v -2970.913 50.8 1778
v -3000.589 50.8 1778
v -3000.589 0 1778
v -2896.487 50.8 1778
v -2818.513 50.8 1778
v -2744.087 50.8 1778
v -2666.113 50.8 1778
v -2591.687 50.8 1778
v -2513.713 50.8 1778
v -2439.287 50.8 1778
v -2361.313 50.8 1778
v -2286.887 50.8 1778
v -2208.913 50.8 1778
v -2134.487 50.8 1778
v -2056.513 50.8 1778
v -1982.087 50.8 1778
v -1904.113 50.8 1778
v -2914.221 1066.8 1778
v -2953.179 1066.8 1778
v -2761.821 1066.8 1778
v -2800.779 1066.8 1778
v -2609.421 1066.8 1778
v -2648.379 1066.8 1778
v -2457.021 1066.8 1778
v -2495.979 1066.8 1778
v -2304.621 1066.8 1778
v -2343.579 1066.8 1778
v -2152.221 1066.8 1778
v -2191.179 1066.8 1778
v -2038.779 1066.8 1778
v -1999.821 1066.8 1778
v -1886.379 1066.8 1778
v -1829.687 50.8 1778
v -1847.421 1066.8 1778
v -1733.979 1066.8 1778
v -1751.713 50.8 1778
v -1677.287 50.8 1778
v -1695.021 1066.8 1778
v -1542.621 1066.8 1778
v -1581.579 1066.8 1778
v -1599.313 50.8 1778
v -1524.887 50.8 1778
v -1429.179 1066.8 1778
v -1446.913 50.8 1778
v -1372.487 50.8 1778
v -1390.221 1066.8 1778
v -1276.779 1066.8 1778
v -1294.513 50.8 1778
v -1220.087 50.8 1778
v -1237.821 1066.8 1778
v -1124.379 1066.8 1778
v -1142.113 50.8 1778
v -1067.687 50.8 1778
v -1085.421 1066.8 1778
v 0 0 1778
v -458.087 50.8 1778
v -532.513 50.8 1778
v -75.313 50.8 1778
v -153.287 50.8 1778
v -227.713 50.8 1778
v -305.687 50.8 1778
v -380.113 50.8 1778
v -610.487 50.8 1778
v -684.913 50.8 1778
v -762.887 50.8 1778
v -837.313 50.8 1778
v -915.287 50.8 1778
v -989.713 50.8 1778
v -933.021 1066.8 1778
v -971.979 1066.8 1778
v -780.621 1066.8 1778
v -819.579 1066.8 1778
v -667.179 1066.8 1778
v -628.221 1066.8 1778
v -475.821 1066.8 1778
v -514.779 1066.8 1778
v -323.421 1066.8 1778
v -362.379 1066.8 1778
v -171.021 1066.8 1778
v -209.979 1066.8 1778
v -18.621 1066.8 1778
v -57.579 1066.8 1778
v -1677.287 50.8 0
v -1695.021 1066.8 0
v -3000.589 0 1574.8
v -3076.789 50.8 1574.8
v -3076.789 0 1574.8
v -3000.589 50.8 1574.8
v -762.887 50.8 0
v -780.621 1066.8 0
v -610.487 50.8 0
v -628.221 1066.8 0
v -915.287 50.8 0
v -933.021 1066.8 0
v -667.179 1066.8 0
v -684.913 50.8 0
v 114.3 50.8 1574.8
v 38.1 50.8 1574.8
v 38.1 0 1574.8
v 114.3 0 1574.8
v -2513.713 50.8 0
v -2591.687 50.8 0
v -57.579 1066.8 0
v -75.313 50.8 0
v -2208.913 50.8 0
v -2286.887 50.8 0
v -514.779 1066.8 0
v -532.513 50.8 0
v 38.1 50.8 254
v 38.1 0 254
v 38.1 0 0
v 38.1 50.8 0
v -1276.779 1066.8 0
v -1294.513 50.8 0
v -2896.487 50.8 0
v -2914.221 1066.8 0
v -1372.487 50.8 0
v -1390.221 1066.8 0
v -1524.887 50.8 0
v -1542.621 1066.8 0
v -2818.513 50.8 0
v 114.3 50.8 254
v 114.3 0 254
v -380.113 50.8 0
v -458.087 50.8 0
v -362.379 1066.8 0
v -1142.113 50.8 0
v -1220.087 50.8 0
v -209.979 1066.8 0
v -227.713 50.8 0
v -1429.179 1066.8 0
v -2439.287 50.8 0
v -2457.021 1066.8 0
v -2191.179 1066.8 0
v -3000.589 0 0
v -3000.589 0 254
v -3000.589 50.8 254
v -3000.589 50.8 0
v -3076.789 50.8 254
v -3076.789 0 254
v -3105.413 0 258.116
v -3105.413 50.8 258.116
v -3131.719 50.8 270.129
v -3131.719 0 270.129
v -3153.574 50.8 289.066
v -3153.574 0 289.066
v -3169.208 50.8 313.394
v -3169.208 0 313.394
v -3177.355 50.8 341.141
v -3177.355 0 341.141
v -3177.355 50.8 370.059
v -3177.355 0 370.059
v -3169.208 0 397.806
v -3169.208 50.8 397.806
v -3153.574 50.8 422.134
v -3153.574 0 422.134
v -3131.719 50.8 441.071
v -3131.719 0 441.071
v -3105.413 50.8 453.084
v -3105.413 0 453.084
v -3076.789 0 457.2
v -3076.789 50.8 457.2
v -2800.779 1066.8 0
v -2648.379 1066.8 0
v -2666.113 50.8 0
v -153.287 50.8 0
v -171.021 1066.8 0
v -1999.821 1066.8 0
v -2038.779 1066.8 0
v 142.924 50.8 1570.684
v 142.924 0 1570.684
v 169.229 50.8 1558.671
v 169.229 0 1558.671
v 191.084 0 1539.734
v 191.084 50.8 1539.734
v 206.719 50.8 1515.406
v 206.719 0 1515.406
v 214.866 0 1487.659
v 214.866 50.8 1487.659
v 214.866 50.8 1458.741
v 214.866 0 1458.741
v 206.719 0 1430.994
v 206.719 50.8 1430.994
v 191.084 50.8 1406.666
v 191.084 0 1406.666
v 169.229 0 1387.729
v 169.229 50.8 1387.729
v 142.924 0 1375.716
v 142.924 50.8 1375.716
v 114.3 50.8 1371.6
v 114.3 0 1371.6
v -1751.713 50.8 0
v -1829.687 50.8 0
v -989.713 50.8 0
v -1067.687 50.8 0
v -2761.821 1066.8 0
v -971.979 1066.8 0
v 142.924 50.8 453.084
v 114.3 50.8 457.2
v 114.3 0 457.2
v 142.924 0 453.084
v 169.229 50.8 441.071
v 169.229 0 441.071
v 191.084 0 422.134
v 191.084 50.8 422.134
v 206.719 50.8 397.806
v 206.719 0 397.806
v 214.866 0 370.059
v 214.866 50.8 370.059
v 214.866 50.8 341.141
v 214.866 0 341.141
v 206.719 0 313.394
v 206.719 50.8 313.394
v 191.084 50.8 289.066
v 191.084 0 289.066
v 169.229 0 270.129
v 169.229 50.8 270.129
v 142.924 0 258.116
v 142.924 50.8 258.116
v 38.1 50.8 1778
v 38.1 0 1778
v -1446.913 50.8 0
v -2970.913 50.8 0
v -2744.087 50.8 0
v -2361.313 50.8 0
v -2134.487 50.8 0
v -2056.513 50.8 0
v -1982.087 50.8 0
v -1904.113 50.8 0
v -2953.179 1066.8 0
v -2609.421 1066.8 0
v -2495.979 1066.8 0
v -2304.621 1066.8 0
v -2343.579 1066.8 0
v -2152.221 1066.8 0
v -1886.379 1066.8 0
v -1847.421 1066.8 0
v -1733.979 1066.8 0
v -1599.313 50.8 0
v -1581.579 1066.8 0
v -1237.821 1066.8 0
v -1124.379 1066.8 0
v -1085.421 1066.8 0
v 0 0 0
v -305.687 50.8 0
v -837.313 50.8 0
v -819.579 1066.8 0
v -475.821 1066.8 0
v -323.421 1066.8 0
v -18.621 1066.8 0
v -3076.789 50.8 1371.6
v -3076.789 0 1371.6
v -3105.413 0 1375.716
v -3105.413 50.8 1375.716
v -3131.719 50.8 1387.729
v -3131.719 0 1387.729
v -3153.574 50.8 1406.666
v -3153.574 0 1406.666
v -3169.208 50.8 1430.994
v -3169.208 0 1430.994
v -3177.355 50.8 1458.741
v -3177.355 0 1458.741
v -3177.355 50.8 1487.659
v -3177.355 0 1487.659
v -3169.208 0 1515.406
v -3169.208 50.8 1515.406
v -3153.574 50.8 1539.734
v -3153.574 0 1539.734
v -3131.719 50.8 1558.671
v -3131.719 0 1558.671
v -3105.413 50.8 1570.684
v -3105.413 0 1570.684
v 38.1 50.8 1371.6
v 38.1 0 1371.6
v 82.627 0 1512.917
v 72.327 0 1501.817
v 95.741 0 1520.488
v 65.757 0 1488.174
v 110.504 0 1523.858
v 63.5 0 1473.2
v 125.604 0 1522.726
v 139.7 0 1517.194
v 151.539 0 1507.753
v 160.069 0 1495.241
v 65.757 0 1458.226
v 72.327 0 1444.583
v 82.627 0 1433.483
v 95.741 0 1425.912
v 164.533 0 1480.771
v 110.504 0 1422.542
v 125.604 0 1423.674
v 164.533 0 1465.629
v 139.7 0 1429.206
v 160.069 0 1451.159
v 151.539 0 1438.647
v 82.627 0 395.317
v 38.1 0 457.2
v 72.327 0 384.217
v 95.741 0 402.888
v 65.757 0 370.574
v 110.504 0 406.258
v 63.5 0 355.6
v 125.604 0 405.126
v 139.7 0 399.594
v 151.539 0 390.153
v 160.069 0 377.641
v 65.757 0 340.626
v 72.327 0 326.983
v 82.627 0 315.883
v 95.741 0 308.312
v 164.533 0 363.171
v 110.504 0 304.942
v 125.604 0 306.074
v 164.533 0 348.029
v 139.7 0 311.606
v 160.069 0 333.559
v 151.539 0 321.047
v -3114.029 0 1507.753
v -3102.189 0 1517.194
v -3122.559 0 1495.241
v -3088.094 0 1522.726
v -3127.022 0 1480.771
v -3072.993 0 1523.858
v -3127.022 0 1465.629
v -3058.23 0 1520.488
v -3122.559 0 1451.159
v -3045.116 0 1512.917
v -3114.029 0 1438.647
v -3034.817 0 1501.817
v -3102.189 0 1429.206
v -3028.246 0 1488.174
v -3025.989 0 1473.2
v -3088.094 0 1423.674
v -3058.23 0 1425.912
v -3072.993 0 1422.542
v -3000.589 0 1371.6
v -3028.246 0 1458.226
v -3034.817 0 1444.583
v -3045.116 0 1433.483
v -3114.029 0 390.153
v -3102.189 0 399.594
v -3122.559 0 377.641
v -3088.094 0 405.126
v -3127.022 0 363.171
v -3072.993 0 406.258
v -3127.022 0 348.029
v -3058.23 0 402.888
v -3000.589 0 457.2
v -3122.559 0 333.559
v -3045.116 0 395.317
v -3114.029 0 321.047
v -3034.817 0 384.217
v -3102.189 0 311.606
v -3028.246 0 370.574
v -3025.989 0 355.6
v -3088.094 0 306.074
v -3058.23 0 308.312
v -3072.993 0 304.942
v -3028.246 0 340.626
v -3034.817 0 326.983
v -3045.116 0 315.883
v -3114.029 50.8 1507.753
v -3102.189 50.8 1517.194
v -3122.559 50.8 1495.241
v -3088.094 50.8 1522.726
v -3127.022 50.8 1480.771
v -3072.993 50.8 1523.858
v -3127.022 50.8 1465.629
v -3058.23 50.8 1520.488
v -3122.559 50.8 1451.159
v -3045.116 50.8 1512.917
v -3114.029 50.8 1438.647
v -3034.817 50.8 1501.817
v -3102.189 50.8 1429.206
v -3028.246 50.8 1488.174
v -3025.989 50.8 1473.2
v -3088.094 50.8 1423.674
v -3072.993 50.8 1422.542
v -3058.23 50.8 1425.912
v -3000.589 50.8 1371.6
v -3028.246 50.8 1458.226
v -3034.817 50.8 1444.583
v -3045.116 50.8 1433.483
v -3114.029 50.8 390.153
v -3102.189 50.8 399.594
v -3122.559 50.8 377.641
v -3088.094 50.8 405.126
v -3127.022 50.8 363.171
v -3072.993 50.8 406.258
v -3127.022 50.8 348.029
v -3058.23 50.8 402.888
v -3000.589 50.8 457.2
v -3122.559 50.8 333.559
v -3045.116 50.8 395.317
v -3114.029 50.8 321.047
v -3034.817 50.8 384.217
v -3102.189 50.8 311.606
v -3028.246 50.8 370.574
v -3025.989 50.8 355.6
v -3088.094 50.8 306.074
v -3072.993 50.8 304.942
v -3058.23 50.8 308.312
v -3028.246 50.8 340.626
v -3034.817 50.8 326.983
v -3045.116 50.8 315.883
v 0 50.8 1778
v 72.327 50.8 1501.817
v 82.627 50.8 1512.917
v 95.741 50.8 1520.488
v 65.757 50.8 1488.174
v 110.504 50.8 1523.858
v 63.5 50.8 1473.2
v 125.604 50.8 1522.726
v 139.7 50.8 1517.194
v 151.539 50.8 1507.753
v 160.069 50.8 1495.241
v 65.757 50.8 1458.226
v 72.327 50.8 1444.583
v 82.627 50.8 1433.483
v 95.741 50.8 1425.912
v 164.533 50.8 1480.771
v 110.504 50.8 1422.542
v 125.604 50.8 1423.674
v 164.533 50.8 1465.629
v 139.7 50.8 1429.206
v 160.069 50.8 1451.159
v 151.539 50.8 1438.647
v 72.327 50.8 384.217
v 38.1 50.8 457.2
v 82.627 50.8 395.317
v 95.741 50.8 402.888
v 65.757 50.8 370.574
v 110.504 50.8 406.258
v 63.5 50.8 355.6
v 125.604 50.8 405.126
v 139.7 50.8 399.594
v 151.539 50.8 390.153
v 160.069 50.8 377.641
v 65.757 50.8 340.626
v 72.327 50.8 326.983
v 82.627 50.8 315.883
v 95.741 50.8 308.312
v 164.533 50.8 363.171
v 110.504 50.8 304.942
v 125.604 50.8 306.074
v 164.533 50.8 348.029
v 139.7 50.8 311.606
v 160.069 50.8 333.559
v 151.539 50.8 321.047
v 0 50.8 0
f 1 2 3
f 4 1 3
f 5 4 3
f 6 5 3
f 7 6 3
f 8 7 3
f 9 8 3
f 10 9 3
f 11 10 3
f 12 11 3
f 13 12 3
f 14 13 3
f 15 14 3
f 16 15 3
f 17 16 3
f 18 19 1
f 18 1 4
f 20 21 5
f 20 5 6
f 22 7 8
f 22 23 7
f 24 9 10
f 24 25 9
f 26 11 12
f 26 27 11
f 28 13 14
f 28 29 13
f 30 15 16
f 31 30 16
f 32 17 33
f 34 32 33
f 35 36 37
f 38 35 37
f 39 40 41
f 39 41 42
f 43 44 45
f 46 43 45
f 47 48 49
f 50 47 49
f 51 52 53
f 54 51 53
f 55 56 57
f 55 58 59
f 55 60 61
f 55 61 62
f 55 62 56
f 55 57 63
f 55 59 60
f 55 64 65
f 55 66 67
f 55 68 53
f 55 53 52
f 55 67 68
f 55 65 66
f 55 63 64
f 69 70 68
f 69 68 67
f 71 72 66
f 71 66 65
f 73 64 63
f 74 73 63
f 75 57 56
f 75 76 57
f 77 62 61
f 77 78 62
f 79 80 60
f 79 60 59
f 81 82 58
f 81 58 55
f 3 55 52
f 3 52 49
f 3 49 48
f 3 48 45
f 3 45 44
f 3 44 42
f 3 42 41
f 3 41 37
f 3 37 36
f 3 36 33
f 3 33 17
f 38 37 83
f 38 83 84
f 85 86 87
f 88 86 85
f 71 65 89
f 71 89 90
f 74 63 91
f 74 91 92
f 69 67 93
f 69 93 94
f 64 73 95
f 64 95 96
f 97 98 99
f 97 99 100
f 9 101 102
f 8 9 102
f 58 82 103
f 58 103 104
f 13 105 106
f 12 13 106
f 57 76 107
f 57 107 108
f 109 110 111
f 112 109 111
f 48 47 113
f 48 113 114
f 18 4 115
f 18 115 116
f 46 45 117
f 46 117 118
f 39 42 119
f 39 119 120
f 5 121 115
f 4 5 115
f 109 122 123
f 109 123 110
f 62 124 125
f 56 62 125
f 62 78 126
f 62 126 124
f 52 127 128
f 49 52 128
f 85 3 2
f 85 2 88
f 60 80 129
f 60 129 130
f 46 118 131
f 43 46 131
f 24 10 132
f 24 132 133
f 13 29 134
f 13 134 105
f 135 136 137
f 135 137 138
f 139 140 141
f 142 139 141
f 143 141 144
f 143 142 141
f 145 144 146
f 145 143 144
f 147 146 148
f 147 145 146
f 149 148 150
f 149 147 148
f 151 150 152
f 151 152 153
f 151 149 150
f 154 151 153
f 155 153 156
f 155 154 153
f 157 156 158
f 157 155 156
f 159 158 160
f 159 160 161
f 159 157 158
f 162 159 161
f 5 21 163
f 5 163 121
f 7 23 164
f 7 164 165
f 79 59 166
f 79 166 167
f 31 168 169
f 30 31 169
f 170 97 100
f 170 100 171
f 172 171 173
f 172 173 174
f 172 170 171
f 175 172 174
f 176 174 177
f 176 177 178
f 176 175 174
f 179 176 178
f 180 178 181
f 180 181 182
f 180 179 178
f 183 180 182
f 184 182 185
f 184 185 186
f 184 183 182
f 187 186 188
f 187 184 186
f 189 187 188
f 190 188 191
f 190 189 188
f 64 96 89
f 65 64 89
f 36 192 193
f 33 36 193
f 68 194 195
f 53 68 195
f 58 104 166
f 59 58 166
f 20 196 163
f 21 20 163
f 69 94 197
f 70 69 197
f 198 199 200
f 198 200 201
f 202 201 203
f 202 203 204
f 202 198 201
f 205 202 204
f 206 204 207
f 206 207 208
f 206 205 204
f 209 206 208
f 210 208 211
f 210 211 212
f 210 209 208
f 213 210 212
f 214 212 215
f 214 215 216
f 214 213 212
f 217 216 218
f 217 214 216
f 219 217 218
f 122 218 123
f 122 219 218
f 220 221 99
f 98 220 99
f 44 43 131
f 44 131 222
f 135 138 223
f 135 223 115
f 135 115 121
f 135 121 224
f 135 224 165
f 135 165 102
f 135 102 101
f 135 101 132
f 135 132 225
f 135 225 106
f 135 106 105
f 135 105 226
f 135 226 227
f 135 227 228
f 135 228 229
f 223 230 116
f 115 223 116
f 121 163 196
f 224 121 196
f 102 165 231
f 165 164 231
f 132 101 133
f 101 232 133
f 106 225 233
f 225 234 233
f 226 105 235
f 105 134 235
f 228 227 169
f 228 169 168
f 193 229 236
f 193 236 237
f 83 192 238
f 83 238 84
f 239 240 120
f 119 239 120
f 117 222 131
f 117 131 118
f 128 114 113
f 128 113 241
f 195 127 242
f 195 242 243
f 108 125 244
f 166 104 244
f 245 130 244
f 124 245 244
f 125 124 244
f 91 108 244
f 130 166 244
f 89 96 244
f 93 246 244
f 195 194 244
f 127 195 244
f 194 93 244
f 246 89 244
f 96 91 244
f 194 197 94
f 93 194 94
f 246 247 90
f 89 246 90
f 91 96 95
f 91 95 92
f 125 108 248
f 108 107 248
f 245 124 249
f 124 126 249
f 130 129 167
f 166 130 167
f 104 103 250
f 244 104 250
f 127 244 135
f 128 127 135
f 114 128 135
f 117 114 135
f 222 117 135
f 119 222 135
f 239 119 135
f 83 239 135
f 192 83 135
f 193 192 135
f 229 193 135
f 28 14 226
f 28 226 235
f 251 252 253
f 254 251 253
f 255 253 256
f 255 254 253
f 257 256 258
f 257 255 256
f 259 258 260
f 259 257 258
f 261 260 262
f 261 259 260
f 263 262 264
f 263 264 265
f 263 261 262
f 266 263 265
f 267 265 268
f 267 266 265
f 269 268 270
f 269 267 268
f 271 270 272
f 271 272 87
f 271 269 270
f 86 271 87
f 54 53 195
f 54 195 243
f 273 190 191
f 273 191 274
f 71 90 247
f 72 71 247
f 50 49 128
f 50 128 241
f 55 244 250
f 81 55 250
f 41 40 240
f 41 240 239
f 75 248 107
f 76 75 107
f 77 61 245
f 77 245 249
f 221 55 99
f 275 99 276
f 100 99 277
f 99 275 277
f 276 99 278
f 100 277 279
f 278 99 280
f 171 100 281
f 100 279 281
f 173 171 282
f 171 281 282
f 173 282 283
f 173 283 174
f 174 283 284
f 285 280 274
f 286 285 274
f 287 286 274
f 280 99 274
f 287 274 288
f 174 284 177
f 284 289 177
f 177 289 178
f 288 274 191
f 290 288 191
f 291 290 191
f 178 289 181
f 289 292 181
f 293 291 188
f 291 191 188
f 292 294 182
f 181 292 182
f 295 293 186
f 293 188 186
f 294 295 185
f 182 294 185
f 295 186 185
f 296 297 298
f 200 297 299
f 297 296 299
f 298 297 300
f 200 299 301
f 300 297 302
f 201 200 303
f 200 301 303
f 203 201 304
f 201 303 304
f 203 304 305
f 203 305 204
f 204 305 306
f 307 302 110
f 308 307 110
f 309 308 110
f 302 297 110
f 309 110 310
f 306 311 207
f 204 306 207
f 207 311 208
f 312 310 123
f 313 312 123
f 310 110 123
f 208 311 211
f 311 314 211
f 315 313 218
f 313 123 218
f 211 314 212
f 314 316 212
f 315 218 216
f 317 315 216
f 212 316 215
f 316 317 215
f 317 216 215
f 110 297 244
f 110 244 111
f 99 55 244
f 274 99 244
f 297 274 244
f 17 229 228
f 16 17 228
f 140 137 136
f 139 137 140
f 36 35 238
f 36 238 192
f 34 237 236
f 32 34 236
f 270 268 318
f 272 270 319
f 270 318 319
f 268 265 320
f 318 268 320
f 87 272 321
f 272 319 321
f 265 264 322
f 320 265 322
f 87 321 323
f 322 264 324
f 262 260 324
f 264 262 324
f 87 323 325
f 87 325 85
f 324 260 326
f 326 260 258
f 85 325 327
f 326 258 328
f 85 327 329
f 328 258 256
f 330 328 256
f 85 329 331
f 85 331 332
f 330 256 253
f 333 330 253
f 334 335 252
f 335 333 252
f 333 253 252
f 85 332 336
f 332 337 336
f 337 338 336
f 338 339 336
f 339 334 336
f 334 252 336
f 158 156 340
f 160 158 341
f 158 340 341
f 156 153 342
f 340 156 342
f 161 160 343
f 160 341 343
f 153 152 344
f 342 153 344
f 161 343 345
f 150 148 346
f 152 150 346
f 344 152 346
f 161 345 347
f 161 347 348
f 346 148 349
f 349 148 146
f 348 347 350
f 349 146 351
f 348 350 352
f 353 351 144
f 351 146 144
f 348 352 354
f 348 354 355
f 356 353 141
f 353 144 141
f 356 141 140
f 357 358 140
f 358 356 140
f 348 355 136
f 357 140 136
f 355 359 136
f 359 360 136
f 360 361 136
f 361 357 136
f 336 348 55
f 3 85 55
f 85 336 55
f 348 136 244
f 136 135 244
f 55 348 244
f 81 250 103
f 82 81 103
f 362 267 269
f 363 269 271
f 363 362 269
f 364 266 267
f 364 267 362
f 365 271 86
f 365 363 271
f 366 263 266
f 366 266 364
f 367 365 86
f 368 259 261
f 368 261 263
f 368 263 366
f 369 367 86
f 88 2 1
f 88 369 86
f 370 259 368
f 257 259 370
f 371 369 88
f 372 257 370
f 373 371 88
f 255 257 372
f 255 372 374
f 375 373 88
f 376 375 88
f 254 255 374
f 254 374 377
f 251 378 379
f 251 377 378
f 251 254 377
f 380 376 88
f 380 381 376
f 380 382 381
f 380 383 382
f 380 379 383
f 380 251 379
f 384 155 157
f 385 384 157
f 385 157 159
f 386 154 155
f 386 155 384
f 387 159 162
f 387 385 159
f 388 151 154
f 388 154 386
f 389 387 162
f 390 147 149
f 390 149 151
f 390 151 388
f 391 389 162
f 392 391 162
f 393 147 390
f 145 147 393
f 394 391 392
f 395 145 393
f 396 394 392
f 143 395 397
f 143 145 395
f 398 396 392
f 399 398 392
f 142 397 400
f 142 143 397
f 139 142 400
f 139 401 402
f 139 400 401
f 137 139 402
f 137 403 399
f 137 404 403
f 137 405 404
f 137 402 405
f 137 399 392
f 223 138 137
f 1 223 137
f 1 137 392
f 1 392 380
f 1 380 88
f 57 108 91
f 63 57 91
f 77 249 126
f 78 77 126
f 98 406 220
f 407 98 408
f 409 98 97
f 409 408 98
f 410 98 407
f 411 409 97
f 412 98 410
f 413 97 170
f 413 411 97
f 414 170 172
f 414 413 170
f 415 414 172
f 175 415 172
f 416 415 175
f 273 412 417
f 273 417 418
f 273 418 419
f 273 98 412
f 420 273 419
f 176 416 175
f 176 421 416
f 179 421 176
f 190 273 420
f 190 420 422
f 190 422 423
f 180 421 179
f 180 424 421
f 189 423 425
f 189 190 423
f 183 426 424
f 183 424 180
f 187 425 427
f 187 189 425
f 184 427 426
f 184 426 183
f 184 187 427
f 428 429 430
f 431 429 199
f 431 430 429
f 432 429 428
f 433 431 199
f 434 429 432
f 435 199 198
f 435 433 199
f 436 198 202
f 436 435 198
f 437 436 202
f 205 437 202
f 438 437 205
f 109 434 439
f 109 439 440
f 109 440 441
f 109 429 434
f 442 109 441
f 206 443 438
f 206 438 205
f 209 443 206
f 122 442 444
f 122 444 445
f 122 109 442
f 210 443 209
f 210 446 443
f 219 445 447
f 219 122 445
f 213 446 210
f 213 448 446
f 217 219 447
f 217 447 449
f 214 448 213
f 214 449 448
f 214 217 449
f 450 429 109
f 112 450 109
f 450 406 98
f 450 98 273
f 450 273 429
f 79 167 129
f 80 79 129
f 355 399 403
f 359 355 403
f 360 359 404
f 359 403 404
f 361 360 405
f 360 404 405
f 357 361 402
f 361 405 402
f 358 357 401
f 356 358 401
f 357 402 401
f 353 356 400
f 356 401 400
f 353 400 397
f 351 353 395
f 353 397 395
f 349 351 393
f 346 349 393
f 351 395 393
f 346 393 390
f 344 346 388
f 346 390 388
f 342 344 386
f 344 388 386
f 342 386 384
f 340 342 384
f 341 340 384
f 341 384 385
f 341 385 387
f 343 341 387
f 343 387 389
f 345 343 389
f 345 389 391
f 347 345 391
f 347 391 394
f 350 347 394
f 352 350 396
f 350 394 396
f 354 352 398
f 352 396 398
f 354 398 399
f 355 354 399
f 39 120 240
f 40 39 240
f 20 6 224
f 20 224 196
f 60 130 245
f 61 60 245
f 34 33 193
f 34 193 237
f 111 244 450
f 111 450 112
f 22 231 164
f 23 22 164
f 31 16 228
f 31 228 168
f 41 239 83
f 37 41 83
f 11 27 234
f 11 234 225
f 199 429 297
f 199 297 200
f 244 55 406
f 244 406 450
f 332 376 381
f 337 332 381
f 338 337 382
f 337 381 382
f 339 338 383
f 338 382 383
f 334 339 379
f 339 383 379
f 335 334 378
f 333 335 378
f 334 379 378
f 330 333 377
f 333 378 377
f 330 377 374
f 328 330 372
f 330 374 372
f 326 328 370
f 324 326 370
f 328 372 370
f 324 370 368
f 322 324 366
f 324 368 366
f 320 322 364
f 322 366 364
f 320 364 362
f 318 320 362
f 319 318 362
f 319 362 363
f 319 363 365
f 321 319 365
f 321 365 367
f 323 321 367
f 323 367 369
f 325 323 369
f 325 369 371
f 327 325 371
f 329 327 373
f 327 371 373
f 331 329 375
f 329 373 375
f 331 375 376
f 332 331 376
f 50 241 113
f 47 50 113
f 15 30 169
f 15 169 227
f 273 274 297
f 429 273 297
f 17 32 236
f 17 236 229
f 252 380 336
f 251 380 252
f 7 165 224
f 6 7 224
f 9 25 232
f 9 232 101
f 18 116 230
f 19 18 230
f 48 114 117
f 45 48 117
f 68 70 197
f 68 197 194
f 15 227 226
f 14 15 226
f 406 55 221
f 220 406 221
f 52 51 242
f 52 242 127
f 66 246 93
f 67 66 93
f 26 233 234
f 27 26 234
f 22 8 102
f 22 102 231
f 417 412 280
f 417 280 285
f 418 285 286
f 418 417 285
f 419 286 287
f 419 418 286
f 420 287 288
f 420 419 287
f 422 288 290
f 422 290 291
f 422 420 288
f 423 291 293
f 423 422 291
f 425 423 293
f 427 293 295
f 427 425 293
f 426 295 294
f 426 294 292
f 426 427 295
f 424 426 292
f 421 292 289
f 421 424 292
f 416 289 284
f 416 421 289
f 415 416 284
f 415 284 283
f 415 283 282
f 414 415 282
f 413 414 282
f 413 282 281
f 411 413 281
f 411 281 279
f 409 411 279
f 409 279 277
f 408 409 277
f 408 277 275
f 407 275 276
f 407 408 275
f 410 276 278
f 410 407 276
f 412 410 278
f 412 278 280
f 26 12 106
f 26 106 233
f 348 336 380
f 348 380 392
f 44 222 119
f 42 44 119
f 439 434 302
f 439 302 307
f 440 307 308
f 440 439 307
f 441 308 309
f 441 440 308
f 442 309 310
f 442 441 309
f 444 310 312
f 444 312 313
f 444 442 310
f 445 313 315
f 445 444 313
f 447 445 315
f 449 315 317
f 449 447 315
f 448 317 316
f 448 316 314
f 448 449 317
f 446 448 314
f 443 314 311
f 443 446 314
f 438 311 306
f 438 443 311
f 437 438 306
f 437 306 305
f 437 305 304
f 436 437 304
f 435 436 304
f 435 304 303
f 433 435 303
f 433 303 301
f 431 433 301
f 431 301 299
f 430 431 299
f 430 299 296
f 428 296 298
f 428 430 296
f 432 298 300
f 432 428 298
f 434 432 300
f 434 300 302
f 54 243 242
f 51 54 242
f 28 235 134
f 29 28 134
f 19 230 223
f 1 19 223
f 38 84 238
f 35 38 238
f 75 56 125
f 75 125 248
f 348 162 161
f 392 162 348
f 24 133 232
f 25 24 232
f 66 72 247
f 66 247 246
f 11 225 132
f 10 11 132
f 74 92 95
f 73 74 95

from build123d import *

# Parameters (mm, degrees)
BOSS_EXTRUDE2_DEPTH = 1778
LPATTERN3_COUNT     = 19
LPATTERN3_PITCH     = 152.4
SKETCH3_W           = 38.1
SKETCH3_H           = 1778
BOSS_EXTRUDE3_DEPTH = 50.8
BOSS_EXTRUDE5_DEPTH = 50.8
LPATTERN4_COUNT     = 2
LPATTERN4_PITCH     = 1117.6
SKETCH5_R           = 50.8
BOSS_EXTRUDE6_DEPTH = 50.8
LPATTERN5_COUNT     = 2
LPATTERN5_PITCH     = 1117.6


with BuildPart() as part:
    # Sketch1 → Boss-Extrude2 (new body)
    with BuildSketch(Plane.XY):
        Polygon((-152.4, 50.8), (-153.286717298, 50.8), (-171.021063265, 1066.8), (-209.978936735, 1066.8), (-228.6, 0), (-152.4, 0), (-76.2, 0), (0, 0), (-18.621063265, 1066.8), (-57.578936735, 1066.8), (-75.313282702, 50.8), (-76.2, 50.8), align=None)
    boss_extrude2 = extrude(amount=BOSS_EXTRUDE2_DEPTH)

    # LPattern3: Boss-Extrude2 ×19
    with Locations(*[(-i * LPATTERN3_PITCH, 0, 0) for i in range(1, LPATTERN3_COUNT)]):
        add(boss_extrude2)

    # Sketch3 → Boss-Extrude3 (add)
    with BuildSketch(Plane(origin=(0, 0, 0), x_dir=(1, 0, 0), z_dir=(0, 1, 0))):
        with Locations((19.05, -889)):
            Rectangle(SKETCH3_W, SKETCH3_H)
        with Locations((-2981.539468367, -889)):
            Rectangle(SKETCH3_W, SKETCH3_H)
    extrude(amount=BOSS_EXTRUDE3_DEPTH)

    # Sketch4 → Boss-Extrude5 (add)
    with BuildSketch(Plane(origin=(0, 50.8, 0), x_dir=(1, 0, 0), z_dir=(0, 1, 0))):
        with BuildLine():
            Line((38.1, -1473.2), (38.1, -1574.8))
            Line((38.1, -1574.8), (114.3, -1574.8))
            ThreePointArc((114.3, -1574.8), (215.9, -1473.2), (114.3, -1371.6))
            Line((114.3, -1371.6), (38.1, -1371.6))
            Line((38.1, -1371.6), (38.1, -1473.2))
        make_face()
        with BuildLine():
            ThreePointArc((165.1, -1473.2), (114.3, -1524), (63.5, -1473.2))
            ThreePointArc((63.5, -1473.2), (114.3, -1422.4), (165.1, -1473.2))
        make_face(mode=Mode.SUBTRACT)
    boss_extrude5 = extrude(amount=-BOSS_EXTRUDE5_DEPTH)

    # LPattern4: Boss-Extrude5 ×2
    with Locations(*[(0, 0, -i * LPATTERN4_PITCH) for i in range(1, LPATTERN4_COUNT)]):
        add(boss_extrude5)

    # Sketch5 → Boss-Extrude6 (add)
    with BuildSketch(Plane(origin=(0, 50.8, 0), x_dir=(1, 0, 0), z_dir=(0, 1, 0))):
        with BuildLine():
            Line((-3076.789468367, -1574.8), (-3000.589468367, -1574.8))
            Line((-3000.589468367, -1574.8), (-3000.589468367, -1473.2))
            Line((-3000.589468367, -1473.2), (-3000.589468367, -1371.6))
            Line((-3000.589468367, -1371.6), (-3076.789468367, -1371.6))
            ThreePointArc((-3076.789468367, -1371.6), (-3178.389468367, -1473.2), (-3076.789468367, -1574.8))
        make_face()
        with Locations((-3076.789468367, -1473.2)):
            Circle(SKETCH5_R, mode=Mode.SUBTRACT)
    boss_extrude6 = extrude(amount=-BOSS_EXTRUDE6_DEPTH)

    # LPattern5: Boss-Extrude6 ×2
    with Locations(*[(0, 0, -i * LPATTERN5_PITCH) for i in range(1, LPATTERN5_COUNT)]):
        add(boss_extrude6)


solid = part.part
